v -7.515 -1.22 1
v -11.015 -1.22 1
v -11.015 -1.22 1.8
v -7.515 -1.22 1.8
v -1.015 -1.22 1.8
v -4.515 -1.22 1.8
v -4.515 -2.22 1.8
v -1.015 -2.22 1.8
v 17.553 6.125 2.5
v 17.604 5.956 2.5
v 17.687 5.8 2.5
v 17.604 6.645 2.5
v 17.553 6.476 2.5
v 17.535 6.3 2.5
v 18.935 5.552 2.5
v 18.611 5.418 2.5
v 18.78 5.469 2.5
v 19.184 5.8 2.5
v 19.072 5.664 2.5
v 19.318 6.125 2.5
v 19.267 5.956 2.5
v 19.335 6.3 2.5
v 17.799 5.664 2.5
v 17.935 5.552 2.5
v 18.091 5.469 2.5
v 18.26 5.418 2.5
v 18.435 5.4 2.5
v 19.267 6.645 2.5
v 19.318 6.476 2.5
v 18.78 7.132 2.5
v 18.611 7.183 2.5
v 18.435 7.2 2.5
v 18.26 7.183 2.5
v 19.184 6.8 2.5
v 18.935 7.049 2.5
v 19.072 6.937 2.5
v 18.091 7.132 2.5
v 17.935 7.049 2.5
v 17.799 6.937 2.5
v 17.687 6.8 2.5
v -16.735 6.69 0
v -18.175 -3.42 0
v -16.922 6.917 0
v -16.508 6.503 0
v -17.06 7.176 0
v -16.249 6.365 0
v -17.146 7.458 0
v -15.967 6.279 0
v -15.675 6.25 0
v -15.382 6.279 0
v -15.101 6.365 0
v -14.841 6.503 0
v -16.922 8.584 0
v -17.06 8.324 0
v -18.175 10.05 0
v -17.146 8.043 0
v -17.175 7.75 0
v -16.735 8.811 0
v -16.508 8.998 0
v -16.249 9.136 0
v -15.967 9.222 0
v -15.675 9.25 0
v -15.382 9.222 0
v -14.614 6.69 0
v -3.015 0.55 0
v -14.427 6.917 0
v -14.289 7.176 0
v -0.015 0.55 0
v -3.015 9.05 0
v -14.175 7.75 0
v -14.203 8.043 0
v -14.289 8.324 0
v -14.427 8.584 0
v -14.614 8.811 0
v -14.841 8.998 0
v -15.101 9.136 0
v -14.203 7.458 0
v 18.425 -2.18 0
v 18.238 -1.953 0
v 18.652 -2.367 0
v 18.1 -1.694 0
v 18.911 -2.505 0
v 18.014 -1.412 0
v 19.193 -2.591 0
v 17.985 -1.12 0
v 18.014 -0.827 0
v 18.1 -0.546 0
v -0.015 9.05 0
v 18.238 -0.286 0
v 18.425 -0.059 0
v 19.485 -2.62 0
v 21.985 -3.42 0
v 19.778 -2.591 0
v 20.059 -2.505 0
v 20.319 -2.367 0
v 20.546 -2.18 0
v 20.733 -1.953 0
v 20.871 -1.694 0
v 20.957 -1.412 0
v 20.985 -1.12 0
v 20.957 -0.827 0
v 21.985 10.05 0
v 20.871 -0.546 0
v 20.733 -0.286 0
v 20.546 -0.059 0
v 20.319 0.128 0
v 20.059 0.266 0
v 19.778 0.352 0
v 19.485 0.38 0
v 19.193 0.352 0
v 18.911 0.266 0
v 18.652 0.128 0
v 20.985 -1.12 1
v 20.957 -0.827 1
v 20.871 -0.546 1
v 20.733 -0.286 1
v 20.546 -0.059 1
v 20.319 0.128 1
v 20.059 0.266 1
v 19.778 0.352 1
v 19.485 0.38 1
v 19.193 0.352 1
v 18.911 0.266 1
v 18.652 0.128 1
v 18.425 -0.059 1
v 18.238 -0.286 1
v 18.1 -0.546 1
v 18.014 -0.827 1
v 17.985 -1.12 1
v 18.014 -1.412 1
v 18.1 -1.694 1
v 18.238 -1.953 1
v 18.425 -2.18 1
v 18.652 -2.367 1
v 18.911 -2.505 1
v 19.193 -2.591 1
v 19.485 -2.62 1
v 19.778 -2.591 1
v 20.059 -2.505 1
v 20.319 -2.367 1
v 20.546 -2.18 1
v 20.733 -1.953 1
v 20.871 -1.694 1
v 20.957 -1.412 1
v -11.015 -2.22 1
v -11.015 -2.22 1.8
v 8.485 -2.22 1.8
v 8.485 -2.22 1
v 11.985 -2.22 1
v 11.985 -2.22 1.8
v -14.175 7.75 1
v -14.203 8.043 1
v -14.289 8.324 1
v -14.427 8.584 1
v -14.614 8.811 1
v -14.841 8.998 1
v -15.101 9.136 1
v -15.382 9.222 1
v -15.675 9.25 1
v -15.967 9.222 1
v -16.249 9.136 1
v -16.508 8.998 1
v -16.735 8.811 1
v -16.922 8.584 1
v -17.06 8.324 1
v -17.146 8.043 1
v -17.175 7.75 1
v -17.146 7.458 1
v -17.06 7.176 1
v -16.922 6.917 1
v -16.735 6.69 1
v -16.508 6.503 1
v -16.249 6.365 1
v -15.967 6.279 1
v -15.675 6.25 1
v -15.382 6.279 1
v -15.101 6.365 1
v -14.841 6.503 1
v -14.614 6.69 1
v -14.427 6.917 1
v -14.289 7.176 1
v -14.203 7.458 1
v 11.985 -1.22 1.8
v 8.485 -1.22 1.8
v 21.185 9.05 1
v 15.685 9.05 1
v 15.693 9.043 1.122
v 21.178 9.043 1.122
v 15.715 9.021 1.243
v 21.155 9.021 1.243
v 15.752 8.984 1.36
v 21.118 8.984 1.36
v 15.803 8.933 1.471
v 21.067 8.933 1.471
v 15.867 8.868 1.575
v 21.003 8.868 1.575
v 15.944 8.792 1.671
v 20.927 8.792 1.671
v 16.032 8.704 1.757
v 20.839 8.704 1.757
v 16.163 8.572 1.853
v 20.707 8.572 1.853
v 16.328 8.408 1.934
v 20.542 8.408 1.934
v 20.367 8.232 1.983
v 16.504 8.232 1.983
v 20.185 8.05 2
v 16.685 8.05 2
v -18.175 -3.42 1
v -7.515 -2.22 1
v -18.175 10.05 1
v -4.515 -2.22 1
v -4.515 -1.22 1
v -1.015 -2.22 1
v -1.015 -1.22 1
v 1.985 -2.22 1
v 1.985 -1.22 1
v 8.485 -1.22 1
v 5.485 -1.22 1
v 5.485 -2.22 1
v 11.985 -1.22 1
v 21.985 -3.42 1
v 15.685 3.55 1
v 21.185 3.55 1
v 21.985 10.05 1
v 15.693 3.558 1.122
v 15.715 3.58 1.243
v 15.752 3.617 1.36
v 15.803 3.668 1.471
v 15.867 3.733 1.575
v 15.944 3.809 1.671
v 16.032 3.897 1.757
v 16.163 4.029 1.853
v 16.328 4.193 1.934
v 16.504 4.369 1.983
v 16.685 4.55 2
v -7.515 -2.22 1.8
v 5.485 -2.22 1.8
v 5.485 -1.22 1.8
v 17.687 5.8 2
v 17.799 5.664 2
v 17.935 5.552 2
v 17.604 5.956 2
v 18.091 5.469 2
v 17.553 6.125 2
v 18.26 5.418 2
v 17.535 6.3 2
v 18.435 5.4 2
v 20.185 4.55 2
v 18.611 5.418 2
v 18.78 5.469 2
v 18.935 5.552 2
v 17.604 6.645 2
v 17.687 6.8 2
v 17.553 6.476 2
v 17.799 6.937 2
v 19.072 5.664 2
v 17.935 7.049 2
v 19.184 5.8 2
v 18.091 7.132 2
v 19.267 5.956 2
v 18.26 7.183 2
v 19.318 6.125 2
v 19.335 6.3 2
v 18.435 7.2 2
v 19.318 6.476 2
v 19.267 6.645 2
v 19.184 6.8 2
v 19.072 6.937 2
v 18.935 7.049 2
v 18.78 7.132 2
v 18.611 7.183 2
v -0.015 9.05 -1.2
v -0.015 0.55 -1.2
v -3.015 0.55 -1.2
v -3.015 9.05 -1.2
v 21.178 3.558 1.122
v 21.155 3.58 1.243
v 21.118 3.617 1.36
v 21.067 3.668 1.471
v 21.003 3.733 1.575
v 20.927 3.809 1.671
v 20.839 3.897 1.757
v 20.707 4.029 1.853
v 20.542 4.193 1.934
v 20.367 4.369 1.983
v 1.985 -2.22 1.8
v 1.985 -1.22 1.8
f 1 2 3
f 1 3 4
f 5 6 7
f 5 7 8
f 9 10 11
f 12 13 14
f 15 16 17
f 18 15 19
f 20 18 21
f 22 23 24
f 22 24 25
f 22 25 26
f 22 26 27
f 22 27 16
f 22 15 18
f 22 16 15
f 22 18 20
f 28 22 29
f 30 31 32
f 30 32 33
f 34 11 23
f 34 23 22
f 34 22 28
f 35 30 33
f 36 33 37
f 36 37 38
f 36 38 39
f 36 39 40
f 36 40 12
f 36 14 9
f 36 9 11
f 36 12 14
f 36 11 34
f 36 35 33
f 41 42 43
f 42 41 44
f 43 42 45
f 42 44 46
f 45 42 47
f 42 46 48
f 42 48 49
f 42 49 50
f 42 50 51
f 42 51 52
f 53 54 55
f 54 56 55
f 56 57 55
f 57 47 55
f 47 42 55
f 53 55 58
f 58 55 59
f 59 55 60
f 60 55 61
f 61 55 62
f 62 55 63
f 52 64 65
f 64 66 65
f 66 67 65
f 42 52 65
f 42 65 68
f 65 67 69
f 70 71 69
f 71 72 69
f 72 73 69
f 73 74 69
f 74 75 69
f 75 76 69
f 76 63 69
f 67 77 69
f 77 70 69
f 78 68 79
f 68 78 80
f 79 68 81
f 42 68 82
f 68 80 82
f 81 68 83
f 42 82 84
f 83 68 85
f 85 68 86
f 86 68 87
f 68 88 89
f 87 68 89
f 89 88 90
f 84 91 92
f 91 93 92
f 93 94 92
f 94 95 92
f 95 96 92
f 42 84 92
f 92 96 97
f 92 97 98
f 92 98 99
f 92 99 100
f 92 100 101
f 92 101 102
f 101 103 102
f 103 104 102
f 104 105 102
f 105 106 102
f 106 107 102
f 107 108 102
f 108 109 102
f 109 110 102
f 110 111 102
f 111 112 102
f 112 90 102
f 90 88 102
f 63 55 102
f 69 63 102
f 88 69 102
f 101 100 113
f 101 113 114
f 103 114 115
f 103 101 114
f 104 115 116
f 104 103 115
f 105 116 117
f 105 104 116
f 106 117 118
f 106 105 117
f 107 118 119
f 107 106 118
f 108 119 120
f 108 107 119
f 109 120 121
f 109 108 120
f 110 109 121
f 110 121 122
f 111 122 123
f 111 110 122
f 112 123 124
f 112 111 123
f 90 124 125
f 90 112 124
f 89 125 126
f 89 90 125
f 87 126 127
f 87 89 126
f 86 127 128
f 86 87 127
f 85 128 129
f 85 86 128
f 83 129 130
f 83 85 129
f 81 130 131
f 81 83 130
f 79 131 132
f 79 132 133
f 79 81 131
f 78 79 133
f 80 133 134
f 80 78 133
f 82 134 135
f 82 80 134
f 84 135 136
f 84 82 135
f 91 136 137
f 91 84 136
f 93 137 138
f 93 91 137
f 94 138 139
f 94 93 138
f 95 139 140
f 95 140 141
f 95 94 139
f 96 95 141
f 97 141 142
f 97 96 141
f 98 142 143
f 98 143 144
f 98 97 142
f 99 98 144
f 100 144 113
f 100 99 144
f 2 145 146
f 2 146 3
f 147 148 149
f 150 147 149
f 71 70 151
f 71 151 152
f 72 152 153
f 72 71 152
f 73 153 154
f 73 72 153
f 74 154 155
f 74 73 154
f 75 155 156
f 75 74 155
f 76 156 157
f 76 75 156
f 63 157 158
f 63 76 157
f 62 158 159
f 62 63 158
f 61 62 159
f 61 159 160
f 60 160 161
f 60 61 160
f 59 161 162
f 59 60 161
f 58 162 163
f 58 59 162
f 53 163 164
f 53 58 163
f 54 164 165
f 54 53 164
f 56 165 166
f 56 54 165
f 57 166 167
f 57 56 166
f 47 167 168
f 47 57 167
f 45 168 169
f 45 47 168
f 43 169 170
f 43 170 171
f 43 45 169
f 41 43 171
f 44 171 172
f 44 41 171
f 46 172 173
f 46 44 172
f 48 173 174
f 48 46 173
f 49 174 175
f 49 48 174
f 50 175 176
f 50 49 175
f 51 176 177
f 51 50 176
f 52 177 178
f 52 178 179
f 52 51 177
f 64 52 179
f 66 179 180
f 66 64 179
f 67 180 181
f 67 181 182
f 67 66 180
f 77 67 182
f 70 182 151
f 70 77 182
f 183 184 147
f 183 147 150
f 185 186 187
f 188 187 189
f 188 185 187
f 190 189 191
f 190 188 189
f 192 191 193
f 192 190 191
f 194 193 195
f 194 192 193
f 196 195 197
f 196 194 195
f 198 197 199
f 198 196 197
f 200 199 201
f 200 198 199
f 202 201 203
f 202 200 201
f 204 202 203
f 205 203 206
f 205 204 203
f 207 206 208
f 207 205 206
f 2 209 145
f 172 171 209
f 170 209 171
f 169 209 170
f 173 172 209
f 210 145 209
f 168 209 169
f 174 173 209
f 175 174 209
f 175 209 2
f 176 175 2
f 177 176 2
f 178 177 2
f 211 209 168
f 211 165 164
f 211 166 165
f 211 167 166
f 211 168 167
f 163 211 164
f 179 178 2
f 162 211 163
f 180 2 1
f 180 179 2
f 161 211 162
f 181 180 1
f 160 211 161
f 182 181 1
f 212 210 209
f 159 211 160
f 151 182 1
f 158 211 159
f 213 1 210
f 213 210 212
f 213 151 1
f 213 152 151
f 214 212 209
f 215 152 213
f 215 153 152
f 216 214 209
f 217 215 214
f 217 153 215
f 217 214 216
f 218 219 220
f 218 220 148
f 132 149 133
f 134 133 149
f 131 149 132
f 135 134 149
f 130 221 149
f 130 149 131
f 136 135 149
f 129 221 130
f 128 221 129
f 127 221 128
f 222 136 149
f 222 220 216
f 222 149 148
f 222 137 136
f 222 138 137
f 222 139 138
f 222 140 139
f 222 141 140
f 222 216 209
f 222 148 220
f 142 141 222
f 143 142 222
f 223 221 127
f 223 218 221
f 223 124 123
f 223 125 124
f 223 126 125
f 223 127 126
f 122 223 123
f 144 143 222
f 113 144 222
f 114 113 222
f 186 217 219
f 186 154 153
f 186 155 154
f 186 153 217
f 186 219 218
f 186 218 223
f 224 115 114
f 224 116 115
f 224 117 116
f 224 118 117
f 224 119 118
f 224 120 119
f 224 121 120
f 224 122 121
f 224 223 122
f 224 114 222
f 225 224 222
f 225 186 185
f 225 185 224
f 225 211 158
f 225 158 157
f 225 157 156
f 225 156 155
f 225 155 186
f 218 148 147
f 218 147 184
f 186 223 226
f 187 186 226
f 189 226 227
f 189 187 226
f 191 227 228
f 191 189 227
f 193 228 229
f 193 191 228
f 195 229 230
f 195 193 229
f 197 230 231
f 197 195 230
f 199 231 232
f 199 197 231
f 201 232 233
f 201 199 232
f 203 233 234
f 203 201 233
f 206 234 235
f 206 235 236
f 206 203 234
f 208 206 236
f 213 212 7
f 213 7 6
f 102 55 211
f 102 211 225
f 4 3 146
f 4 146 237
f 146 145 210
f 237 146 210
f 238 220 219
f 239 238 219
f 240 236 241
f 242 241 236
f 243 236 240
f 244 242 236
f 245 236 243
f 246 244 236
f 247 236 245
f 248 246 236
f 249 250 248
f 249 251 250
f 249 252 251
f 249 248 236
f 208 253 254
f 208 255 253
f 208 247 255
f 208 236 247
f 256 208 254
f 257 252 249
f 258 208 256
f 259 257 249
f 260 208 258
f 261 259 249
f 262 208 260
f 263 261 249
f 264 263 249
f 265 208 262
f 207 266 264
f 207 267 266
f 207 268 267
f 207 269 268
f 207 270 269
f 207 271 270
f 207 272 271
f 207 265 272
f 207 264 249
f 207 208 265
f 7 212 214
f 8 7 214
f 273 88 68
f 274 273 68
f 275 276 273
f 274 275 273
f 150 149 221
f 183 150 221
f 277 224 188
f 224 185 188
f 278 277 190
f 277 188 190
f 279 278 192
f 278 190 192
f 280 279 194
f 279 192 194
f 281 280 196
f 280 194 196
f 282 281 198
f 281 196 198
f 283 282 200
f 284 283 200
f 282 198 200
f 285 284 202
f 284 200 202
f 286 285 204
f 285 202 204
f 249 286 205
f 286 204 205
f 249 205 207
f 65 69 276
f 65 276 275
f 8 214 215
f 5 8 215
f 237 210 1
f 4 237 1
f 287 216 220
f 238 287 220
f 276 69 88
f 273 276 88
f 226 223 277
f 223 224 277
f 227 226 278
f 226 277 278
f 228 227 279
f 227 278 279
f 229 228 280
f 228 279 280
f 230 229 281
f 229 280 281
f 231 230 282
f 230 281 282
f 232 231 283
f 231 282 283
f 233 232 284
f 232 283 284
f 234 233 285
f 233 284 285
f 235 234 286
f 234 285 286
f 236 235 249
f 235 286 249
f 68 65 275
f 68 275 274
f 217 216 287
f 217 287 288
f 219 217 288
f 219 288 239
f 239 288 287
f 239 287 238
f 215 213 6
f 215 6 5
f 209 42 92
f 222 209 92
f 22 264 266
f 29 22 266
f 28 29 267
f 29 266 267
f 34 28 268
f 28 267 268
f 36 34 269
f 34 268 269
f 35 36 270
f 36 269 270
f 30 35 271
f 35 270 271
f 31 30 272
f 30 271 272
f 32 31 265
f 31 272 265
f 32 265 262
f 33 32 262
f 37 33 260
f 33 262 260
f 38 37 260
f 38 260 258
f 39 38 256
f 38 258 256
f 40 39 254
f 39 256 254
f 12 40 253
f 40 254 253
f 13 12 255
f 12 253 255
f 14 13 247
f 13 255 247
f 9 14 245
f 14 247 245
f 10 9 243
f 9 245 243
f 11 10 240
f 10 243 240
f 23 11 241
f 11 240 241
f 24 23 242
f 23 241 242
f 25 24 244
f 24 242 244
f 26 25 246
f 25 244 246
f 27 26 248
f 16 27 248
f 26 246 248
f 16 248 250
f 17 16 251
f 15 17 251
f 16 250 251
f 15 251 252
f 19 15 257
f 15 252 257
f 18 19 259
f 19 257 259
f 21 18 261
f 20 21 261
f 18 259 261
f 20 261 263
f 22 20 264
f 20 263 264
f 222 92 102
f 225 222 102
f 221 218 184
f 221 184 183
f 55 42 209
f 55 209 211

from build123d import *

# Parameters (mm, degrees)
F0_W     = 40.16
F0_H     = 13.47
F0_W_2   = 3.5
F0_H_2   = 1
F0_R     = 1.5
F0_W_3   = 5.5
F0_H_3   = 5.5
F1_DEPTH = 1
F2_DEPTH = 1.8
F3_DEPTH = 2
F4_R     = 0.99999
F5_R     = 0.9
F6_DEPTH = 0.5
F7_W     = 3
F7_H     = 8.5
F8_DEPTH = 1.2


# Not quite as in the source:
# - a fillet or chamfer is up to 0.001 mm smaller than in the source, because OpenCascade refuses the exact size


with BuildPart() as f1:
    # F0 (on Top) → F1 (new body)
    with BuildSketch(Plane.XY):
        with Locations((1.9053274065, 3.3154582972)):
            Rectangle(F0_W, F0_H)
        with Locations((-9.2646725935, -1.7195417028)):
            Rectangle(F0_W_2, F0_H_2, mode=Mode.SUBTRACT)
        with Locations((-2.7646725935, -1.7195417028)):
            Rectangle(F0_W_2, F0_H_2, mode=Mode.SUBTRACT)
        with Locations((3.7353274065, -1.7195417028)):
            Rectangle(F0_W_2, F0_H_2, mode=Mode.SUBTRACT)
        with Locations((10.2353274065, -1.7195417028)):
            Rectangle(F0_W_2, F0_H_2, mode=Mode.SUBTRACT)
        with Locations((19.4853274065, -1.1195417028)):
            Circle(F0_R, mode=Mode.SUBTRACT)
        with Locations((-15.6746725935, 7.7504582972)):
            Circle(F0_R, mode=Mode.SUBTRACT)
        with Locations((18.4353274065, 6.3004582972)):
            Rectangle(F0_W_3, F0_H_3, mode=Mode.SUBTRACT)
        with Locations((-9.2646725935, -1.7195417028)):
            Rectangle(F0_W_2, F0_H_2)
        with Locations((-2.7646725935, -1.7195417028)):
            Rectangle(F0_W_2, F0_H_2)
        with Locations((3.7353274065, -1.7195417028)):
            Rectangle(F0_W_2, F0_H_2)
        with Locations((10.2353274065, -1.7195417028)):
            Rectangle(F0_W_2, F0_H_2)
        with Locations((18.4353274065, 6.3004582972)):
            Rectangle(F0_W_3, F0_H_3)
    extrude(amount=F1_DEPTH)

    # F0 (on Top) → F2 (join)
    with BuildSketch(Plane.XY):
        with Locations((-9.2646725935, -1.7195417028)):
            Rectangle(F0_W_2, F0_H_2)
        with Locations((-2.7646725935, -1.7195417028)):
            Rectangle(F0_W_2, F0_H_2)
        with Locations((3.7353274065, -1.7195417028)):
            Rectangle(F0_W_2, F0_H_2)
        with Locations((10.2353274065, -1.7195417028)):
            Rectangle(F0_W_2, F0_H_2)
    extrude(amount=F2_DEPTH)

    # F0 (on Top) → F3 (join)
    with BuildSketch(Plane.XY):
        with Locations((18.4353274065, 6.3004582972)):
            Rectangle(F0_W_3, F0_H_3)
    extrude(amount=F3_DEPTH)

    # F4 (radius 1 in the source; OpenCascade refuses exactly that, so slightly less here)
    f4_edges = [f1.edges().sort_by_distance(p)[0] for p in [
        (21.185327, 6.300458, 2),
        (15.685327, 6.300458, 2),
        (18.435327, 3.550458, 2),
        (18.435327, 9.050458, 2),
    ]]
    fillet(f4_edges, radius=F4_R)

    # F5 (on face) → F6 (join)
    with BuildSketch(Plane.XY.offset(2)):
        with Locations((18.4353274065, 6.3004582972)):
            Circle(F5_R)
    extrude(amount=F6_DEPTH)

    # F7 (on face) → F8 (join)
    with BuildSketch(Plane(origin=(0, 0, 0), x_dir=(1, 0, 0), z_dir=(0, 0, -1))):
        with Locations((-1.5146725935, -4.8004582972)):
            Rectangle(F7_W, F7_H)
    extrude(amount=F8_DEPTH)


solid = f1.part
